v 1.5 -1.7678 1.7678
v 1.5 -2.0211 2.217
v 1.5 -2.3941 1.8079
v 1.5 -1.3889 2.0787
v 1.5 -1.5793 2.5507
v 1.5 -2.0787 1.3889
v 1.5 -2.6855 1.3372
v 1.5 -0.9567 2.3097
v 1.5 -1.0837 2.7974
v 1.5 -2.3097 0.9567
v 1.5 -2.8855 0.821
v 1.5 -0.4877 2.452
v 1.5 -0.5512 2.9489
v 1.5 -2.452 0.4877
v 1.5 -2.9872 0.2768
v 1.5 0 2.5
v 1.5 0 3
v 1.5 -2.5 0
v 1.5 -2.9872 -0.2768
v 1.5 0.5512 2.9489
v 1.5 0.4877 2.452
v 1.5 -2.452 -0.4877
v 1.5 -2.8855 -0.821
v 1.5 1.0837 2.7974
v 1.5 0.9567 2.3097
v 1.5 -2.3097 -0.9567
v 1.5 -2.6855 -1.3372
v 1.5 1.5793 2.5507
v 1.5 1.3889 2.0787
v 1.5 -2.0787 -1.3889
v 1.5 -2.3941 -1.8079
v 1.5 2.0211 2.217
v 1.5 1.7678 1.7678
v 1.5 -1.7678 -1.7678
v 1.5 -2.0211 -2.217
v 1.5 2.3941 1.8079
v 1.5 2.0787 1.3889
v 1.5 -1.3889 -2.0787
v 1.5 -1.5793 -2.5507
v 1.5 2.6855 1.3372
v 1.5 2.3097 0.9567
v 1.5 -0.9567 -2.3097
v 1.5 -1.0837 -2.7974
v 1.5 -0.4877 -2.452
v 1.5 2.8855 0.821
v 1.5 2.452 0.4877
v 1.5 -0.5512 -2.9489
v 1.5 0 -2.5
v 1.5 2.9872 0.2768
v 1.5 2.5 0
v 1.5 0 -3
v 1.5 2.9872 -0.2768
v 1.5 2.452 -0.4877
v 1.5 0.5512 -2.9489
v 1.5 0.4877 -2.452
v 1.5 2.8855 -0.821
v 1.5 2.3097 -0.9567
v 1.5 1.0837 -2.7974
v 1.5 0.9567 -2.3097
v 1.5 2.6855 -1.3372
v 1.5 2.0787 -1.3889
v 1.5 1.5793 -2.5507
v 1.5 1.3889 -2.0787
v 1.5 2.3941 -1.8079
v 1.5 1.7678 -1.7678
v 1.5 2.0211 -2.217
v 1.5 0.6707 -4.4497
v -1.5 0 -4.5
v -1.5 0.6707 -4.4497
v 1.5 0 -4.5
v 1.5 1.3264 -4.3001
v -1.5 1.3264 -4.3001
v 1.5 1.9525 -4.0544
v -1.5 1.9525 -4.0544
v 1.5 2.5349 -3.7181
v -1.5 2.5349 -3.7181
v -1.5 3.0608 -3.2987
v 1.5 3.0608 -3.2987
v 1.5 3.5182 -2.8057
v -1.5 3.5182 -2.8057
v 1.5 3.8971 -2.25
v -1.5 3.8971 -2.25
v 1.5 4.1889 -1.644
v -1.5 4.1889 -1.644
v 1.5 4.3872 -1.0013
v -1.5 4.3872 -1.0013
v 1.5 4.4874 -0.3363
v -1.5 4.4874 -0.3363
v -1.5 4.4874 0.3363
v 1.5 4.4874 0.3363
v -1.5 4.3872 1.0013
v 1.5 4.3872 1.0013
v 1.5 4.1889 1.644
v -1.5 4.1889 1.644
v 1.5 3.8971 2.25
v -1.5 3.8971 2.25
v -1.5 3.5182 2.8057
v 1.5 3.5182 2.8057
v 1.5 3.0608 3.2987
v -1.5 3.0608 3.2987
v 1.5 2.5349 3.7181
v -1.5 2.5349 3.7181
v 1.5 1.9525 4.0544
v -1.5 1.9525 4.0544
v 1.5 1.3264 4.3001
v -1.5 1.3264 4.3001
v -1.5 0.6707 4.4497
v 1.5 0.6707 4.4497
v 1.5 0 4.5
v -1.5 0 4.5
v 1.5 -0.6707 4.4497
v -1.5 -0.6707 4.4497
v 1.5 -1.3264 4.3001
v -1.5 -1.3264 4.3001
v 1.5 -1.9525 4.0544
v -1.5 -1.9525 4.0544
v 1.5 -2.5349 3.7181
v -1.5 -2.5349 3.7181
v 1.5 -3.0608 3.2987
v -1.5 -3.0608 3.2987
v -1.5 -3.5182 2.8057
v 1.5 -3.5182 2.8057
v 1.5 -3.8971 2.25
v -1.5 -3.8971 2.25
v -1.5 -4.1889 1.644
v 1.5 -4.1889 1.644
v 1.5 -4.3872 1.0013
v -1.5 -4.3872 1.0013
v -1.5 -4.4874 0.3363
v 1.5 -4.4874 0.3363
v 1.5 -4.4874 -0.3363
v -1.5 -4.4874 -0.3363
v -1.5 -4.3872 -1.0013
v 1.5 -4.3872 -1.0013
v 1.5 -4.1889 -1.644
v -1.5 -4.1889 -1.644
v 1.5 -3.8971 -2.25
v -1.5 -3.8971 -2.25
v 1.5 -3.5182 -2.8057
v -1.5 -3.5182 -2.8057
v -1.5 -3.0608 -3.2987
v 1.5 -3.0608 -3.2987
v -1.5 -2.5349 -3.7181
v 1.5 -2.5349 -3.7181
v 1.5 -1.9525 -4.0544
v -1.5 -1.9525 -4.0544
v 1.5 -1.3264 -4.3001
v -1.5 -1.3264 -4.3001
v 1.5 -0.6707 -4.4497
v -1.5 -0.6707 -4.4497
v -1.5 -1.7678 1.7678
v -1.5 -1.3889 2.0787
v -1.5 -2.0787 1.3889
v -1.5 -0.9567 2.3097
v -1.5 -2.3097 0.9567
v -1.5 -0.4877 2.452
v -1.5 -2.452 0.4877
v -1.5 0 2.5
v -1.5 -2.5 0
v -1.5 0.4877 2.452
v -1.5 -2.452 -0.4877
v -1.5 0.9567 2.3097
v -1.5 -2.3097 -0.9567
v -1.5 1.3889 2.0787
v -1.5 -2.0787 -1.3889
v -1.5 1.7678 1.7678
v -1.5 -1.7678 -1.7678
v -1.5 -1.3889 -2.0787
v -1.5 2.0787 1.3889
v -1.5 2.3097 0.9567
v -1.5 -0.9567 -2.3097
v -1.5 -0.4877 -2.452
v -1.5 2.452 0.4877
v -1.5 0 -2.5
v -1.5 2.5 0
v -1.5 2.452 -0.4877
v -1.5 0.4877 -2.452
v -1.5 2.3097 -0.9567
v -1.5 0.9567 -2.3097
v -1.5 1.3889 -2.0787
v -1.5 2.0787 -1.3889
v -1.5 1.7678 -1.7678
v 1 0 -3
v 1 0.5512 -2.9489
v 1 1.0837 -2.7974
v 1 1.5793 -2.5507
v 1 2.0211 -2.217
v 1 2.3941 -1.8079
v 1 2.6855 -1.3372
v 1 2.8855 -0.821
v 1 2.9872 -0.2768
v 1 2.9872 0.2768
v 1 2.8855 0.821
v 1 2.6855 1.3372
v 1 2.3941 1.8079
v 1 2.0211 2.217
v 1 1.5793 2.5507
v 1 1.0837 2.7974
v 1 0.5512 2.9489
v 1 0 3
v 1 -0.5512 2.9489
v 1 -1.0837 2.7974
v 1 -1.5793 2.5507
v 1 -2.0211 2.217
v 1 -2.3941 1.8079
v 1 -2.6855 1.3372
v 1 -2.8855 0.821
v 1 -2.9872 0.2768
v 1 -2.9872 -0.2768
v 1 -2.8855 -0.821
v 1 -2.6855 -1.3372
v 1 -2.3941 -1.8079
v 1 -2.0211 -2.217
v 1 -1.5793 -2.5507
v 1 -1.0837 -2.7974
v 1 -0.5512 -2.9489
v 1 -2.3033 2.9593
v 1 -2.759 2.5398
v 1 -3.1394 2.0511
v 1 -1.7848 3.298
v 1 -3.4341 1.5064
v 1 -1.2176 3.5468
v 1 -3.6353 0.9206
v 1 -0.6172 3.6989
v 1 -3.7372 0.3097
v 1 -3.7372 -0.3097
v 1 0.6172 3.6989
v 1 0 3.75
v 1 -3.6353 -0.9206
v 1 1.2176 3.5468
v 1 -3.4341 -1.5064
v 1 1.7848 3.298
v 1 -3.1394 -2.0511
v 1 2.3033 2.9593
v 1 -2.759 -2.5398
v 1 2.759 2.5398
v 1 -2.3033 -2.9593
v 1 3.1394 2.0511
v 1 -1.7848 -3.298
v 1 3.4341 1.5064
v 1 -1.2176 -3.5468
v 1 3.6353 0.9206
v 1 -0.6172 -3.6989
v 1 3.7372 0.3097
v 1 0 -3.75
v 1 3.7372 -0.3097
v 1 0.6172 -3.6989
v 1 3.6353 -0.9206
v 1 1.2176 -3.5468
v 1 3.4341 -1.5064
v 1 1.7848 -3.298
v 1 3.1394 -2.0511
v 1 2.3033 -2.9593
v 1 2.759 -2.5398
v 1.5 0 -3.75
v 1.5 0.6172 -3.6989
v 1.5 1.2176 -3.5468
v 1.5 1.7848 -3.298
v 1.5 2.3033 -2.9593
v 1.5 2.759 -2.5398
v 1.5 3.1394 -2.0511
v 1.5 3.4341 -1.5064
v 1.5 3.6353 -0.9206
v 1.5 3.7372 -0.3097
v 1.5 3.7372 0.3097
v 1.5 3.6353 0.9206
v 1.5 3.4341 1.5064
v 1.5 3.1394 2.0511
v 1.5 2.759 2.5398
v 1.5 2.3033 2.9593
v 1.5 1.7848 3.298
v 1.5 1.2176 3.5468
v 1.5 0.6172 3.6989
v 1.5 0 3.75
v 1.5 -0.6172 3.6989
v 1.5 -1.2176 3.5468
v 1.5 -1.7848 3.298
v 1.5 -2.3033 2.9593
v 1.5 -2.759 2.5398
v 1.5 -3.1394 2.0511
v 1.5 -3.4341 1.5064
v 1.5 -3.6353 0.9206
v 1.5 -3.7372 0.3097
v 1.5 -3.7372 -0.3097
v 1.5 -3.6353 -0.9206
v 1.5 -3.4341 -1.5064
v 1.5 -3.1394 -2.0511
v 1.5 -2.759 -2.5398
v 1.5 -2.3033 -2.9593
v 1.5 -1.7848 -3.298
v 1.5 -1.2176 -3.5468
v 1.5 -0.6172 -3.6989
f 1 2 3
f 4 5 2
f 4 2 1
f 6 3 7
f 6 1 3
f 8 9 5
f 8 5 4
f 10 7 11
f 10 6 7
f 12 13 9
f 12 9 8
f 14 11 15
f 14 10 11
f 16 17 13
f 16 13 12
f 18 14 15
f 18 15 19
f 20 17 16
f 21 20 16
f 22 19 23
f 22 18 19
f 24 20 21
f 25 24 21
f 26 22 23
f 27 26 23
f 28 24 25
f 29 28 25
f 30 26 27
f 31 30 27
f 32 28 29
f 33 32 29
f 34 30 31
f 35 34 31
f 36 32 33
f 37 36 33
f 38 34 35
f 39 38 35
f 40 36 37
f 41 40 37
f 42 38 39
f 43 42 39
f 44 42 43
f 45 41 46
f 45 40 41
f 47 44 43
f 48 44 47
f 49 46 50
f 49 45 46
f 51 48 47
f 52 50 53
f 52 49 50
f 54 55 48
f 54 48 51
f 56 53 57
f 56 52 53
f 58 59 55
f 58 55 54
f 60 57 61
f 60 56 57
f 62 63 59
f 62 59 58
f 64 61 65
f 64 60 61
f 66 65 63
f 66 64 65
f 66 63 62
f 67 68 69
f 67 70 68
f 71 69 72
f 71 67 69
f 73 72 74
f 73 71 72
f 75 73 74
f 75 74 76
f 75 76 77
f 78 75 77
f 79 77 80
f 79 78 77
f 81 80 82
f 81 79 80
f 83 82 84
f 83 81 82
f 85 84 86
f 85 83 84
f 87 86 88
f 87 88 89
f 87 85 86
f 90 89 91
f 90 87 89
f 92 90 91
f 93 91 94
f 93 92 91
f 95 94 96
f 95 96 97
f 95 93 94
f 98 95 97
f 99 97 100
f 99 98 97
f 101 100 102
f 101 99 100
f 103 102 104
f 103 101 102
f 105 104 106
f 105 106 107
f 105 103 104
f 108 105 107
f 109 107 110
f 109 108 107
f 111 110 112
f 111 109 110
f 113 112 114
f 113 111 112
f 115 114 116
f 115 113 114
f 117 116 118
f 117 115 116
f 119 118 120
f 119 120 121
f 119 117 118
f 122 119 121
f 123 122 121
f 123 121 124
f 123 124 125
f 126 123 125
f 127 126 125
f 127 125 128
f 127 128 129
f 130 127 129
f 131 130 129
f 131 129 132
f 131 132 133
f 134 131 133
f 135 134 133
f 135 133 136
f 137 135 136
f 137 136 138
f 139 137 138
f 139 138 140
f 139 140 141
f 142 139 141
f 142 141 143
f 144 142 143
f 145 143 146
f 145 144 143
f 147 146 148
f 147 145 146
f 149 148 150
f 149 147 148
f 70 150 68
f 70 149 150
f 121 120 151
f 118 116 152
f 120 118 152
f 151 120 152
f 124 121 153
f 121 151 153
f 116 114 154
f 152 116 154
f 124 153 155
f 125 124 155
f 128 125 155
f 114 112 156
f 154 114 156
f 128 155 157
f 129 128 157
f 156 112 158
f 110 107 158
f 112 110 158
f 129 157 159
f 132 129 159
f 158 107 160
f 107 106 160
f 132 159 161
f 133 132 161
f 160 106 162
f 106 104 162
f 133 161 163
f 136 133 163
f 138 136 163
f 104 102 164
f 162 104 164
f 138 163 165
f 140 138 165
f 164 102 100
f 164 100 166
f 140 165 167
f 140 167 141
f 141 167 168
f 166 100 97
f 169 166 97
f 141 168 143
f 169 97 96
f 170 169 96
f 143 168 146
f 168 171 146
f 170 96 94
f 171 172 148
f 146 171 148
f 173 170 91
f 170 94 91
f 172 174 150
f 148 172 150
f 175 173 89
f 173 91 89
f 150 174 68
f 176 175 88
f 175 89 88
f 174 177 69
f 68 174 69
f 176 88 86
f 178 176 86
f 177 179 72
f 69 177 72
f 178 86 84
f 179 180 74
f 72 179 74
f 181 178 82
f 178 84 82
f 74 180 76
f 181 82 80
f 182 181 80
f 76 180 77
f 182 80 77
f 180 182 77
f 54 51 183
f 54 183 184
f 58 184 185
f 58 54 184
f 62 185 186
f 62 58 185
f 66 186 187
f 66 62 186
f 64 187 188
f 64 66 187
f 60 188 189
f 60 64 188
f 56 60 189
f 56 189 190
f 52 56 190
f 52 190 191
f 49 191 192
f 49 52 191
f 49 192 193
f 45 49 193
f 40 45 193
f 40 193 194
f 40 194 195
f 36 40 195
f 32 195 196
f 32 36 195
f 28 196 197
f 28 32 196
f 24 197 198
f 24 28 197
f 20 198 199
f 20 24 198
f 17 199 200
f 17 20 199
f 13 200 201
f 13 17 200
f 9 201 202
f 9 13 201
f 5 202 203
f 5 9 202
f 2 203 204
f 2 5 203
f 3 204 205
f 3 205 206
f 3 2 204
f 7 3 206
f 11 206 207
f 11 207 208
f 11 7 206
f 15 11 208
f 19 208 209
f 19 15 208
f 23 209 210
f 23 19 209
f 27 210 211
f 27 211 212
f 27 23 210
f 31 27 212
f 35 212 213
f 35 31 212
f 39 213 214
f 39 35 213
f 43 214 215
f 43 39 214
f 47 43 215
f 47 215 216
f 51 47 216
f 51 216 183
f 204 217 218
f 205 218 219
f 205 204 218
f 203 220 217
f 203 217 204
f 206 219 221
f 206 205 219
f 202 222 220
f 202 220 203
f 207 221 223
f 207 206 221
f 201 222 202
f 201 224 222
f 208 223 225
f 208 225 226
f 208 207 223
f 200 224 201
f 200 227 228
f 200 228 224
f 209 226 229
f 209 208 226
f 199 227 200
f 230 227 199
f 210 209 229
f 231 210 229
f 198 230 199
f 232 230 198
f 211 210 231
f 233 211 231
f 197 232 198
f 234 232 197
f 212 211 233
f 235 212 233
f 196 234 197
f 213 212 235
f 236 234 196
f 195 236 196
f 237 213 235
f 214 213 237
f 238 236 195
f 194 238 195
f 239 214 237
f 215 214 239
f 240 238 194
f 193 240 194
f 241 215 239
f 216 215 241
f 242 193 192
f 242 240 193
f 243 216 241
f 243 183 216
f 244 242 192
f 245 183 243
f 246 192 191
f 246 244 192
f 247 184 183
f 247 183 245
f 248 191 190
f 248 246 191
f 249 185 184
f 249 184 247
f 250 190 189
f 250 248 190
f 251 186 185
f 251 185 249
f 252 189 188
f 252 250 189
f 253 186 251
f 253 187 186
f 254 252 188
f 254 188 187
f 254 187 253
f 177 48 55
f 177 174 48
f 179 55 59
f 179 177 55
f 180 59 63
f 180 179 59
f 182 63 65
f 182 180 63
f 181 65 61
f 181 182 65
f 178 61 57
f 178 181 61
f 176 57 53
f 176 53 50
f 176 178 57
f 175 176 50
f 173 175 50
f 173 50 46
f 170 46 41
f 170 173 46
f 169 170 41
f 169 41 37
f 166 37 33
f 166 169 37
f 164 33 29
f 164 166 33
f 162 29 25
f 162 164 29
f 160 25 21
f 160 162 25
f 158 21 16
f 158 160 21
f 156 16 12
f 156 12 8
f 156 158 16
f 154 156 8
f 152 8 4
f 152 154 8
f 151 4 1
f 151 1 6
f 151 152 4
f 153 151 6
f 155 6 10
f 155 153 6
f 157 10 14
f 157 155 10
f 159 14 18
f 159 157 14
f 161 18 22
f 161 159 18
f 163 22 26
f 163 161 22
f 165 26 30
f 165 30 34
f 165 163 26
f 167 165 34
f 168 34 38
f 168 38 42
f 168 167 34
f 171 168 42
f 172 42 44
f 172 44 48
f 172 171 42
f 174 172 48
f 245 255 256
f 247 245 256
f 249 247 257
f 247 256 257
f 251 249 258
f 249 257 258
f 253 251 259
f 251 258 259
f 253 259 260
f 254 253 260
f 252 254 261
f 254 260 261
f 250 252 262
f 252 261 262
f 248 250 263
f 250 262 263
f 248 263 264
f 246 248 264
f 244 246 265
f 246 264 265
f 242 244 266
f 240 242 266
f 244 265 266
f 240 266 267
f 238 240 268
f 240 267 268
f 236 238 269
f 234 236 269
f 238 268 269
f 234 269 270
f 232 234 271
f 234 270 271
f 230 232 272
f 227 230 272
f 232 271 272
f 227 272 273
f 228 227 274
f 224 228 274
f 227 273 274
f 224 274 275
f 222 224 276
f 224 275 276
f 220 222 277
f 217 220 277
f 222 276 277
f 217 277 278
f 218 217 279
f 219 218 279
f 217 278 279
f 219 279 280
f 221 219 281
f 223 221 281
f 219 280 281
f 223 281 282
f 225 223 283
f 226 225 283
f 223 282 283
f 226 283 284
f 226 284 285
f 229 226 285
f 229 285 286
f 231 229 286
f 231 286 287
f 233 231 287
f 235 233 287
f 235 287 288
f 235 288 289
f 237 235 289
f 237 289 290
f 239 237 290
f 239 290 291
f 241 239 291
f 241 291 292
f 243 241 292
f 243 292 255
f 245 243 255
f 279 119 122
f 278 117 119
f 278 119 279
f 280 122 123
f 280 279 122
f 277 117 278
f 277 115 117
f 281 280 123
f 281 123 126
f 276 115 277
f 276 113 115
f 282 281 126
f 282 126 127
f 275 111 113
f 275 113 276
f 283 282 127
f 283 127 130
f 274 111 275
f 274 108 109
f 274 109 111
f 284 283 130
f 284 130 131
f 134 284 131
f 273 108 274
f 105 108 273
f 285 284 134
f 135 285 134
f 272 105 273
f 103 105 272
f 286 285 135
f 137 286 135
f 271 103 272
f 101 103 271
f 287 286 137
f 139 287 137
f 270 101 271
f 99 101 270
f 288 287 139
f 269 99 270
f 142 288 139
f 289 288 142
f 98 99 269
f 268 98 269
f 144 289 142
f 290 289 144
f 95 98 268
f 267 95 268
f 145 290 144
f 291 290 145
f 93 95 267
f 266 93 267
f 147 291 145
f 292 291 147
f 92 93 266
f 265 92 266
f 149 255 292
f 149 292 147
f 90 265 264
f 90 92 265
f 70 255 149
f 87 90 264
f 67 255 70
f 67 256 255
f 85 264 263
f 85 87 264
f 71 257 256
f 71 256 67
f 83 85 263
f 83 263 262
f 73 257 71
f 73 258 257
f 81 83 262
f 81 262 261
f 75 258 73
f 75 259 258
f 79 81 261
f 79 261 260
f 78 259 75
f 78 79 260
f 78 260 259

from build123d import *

# Parameters (mm, degrees)
SKETCH1_R           = 4.5
SKETCH1_R_2         = 2.5
BOSS_EXTRUDE1_DEPTH = 1.5
SKETCH2_R           = 3.75
SKETCH2_R_2         = 3
CUT_EXTRUDE1_DEPTH  = 0.5


with BuildPart() as part:
    # Sketch1 → Boss-Extrude1 (new, symmetric)
    with BuildSketch(Plane(origin=(0, 0, 0), x_dir=(0, 0, -1), z_dir=(1, 0, 0))):
        Circle(SKETCH1_R)
        Circle(SKETCH1_R_2, mode=Mode.SUBTRACT)
    extrude(amount=BOSS_EXTRUDE1_DEPTH, both=True)

    # Sketch2 → Cut-Extrude1 (cut)
    with BuildSketch(Plane(origin=(1.5, 0, 0), x_dir=(0, 0, -1), z_dir=(1, 0, 0))):
        Circle(SKETCH2_R)
        Circle(SKETCH2_R_2, mode=Mode.SUBTRACT)
    extrude(amount=-CUT_EXTRUDE1_DEPTH, mode=Mode.SUBTRACT)


solid = part.part
